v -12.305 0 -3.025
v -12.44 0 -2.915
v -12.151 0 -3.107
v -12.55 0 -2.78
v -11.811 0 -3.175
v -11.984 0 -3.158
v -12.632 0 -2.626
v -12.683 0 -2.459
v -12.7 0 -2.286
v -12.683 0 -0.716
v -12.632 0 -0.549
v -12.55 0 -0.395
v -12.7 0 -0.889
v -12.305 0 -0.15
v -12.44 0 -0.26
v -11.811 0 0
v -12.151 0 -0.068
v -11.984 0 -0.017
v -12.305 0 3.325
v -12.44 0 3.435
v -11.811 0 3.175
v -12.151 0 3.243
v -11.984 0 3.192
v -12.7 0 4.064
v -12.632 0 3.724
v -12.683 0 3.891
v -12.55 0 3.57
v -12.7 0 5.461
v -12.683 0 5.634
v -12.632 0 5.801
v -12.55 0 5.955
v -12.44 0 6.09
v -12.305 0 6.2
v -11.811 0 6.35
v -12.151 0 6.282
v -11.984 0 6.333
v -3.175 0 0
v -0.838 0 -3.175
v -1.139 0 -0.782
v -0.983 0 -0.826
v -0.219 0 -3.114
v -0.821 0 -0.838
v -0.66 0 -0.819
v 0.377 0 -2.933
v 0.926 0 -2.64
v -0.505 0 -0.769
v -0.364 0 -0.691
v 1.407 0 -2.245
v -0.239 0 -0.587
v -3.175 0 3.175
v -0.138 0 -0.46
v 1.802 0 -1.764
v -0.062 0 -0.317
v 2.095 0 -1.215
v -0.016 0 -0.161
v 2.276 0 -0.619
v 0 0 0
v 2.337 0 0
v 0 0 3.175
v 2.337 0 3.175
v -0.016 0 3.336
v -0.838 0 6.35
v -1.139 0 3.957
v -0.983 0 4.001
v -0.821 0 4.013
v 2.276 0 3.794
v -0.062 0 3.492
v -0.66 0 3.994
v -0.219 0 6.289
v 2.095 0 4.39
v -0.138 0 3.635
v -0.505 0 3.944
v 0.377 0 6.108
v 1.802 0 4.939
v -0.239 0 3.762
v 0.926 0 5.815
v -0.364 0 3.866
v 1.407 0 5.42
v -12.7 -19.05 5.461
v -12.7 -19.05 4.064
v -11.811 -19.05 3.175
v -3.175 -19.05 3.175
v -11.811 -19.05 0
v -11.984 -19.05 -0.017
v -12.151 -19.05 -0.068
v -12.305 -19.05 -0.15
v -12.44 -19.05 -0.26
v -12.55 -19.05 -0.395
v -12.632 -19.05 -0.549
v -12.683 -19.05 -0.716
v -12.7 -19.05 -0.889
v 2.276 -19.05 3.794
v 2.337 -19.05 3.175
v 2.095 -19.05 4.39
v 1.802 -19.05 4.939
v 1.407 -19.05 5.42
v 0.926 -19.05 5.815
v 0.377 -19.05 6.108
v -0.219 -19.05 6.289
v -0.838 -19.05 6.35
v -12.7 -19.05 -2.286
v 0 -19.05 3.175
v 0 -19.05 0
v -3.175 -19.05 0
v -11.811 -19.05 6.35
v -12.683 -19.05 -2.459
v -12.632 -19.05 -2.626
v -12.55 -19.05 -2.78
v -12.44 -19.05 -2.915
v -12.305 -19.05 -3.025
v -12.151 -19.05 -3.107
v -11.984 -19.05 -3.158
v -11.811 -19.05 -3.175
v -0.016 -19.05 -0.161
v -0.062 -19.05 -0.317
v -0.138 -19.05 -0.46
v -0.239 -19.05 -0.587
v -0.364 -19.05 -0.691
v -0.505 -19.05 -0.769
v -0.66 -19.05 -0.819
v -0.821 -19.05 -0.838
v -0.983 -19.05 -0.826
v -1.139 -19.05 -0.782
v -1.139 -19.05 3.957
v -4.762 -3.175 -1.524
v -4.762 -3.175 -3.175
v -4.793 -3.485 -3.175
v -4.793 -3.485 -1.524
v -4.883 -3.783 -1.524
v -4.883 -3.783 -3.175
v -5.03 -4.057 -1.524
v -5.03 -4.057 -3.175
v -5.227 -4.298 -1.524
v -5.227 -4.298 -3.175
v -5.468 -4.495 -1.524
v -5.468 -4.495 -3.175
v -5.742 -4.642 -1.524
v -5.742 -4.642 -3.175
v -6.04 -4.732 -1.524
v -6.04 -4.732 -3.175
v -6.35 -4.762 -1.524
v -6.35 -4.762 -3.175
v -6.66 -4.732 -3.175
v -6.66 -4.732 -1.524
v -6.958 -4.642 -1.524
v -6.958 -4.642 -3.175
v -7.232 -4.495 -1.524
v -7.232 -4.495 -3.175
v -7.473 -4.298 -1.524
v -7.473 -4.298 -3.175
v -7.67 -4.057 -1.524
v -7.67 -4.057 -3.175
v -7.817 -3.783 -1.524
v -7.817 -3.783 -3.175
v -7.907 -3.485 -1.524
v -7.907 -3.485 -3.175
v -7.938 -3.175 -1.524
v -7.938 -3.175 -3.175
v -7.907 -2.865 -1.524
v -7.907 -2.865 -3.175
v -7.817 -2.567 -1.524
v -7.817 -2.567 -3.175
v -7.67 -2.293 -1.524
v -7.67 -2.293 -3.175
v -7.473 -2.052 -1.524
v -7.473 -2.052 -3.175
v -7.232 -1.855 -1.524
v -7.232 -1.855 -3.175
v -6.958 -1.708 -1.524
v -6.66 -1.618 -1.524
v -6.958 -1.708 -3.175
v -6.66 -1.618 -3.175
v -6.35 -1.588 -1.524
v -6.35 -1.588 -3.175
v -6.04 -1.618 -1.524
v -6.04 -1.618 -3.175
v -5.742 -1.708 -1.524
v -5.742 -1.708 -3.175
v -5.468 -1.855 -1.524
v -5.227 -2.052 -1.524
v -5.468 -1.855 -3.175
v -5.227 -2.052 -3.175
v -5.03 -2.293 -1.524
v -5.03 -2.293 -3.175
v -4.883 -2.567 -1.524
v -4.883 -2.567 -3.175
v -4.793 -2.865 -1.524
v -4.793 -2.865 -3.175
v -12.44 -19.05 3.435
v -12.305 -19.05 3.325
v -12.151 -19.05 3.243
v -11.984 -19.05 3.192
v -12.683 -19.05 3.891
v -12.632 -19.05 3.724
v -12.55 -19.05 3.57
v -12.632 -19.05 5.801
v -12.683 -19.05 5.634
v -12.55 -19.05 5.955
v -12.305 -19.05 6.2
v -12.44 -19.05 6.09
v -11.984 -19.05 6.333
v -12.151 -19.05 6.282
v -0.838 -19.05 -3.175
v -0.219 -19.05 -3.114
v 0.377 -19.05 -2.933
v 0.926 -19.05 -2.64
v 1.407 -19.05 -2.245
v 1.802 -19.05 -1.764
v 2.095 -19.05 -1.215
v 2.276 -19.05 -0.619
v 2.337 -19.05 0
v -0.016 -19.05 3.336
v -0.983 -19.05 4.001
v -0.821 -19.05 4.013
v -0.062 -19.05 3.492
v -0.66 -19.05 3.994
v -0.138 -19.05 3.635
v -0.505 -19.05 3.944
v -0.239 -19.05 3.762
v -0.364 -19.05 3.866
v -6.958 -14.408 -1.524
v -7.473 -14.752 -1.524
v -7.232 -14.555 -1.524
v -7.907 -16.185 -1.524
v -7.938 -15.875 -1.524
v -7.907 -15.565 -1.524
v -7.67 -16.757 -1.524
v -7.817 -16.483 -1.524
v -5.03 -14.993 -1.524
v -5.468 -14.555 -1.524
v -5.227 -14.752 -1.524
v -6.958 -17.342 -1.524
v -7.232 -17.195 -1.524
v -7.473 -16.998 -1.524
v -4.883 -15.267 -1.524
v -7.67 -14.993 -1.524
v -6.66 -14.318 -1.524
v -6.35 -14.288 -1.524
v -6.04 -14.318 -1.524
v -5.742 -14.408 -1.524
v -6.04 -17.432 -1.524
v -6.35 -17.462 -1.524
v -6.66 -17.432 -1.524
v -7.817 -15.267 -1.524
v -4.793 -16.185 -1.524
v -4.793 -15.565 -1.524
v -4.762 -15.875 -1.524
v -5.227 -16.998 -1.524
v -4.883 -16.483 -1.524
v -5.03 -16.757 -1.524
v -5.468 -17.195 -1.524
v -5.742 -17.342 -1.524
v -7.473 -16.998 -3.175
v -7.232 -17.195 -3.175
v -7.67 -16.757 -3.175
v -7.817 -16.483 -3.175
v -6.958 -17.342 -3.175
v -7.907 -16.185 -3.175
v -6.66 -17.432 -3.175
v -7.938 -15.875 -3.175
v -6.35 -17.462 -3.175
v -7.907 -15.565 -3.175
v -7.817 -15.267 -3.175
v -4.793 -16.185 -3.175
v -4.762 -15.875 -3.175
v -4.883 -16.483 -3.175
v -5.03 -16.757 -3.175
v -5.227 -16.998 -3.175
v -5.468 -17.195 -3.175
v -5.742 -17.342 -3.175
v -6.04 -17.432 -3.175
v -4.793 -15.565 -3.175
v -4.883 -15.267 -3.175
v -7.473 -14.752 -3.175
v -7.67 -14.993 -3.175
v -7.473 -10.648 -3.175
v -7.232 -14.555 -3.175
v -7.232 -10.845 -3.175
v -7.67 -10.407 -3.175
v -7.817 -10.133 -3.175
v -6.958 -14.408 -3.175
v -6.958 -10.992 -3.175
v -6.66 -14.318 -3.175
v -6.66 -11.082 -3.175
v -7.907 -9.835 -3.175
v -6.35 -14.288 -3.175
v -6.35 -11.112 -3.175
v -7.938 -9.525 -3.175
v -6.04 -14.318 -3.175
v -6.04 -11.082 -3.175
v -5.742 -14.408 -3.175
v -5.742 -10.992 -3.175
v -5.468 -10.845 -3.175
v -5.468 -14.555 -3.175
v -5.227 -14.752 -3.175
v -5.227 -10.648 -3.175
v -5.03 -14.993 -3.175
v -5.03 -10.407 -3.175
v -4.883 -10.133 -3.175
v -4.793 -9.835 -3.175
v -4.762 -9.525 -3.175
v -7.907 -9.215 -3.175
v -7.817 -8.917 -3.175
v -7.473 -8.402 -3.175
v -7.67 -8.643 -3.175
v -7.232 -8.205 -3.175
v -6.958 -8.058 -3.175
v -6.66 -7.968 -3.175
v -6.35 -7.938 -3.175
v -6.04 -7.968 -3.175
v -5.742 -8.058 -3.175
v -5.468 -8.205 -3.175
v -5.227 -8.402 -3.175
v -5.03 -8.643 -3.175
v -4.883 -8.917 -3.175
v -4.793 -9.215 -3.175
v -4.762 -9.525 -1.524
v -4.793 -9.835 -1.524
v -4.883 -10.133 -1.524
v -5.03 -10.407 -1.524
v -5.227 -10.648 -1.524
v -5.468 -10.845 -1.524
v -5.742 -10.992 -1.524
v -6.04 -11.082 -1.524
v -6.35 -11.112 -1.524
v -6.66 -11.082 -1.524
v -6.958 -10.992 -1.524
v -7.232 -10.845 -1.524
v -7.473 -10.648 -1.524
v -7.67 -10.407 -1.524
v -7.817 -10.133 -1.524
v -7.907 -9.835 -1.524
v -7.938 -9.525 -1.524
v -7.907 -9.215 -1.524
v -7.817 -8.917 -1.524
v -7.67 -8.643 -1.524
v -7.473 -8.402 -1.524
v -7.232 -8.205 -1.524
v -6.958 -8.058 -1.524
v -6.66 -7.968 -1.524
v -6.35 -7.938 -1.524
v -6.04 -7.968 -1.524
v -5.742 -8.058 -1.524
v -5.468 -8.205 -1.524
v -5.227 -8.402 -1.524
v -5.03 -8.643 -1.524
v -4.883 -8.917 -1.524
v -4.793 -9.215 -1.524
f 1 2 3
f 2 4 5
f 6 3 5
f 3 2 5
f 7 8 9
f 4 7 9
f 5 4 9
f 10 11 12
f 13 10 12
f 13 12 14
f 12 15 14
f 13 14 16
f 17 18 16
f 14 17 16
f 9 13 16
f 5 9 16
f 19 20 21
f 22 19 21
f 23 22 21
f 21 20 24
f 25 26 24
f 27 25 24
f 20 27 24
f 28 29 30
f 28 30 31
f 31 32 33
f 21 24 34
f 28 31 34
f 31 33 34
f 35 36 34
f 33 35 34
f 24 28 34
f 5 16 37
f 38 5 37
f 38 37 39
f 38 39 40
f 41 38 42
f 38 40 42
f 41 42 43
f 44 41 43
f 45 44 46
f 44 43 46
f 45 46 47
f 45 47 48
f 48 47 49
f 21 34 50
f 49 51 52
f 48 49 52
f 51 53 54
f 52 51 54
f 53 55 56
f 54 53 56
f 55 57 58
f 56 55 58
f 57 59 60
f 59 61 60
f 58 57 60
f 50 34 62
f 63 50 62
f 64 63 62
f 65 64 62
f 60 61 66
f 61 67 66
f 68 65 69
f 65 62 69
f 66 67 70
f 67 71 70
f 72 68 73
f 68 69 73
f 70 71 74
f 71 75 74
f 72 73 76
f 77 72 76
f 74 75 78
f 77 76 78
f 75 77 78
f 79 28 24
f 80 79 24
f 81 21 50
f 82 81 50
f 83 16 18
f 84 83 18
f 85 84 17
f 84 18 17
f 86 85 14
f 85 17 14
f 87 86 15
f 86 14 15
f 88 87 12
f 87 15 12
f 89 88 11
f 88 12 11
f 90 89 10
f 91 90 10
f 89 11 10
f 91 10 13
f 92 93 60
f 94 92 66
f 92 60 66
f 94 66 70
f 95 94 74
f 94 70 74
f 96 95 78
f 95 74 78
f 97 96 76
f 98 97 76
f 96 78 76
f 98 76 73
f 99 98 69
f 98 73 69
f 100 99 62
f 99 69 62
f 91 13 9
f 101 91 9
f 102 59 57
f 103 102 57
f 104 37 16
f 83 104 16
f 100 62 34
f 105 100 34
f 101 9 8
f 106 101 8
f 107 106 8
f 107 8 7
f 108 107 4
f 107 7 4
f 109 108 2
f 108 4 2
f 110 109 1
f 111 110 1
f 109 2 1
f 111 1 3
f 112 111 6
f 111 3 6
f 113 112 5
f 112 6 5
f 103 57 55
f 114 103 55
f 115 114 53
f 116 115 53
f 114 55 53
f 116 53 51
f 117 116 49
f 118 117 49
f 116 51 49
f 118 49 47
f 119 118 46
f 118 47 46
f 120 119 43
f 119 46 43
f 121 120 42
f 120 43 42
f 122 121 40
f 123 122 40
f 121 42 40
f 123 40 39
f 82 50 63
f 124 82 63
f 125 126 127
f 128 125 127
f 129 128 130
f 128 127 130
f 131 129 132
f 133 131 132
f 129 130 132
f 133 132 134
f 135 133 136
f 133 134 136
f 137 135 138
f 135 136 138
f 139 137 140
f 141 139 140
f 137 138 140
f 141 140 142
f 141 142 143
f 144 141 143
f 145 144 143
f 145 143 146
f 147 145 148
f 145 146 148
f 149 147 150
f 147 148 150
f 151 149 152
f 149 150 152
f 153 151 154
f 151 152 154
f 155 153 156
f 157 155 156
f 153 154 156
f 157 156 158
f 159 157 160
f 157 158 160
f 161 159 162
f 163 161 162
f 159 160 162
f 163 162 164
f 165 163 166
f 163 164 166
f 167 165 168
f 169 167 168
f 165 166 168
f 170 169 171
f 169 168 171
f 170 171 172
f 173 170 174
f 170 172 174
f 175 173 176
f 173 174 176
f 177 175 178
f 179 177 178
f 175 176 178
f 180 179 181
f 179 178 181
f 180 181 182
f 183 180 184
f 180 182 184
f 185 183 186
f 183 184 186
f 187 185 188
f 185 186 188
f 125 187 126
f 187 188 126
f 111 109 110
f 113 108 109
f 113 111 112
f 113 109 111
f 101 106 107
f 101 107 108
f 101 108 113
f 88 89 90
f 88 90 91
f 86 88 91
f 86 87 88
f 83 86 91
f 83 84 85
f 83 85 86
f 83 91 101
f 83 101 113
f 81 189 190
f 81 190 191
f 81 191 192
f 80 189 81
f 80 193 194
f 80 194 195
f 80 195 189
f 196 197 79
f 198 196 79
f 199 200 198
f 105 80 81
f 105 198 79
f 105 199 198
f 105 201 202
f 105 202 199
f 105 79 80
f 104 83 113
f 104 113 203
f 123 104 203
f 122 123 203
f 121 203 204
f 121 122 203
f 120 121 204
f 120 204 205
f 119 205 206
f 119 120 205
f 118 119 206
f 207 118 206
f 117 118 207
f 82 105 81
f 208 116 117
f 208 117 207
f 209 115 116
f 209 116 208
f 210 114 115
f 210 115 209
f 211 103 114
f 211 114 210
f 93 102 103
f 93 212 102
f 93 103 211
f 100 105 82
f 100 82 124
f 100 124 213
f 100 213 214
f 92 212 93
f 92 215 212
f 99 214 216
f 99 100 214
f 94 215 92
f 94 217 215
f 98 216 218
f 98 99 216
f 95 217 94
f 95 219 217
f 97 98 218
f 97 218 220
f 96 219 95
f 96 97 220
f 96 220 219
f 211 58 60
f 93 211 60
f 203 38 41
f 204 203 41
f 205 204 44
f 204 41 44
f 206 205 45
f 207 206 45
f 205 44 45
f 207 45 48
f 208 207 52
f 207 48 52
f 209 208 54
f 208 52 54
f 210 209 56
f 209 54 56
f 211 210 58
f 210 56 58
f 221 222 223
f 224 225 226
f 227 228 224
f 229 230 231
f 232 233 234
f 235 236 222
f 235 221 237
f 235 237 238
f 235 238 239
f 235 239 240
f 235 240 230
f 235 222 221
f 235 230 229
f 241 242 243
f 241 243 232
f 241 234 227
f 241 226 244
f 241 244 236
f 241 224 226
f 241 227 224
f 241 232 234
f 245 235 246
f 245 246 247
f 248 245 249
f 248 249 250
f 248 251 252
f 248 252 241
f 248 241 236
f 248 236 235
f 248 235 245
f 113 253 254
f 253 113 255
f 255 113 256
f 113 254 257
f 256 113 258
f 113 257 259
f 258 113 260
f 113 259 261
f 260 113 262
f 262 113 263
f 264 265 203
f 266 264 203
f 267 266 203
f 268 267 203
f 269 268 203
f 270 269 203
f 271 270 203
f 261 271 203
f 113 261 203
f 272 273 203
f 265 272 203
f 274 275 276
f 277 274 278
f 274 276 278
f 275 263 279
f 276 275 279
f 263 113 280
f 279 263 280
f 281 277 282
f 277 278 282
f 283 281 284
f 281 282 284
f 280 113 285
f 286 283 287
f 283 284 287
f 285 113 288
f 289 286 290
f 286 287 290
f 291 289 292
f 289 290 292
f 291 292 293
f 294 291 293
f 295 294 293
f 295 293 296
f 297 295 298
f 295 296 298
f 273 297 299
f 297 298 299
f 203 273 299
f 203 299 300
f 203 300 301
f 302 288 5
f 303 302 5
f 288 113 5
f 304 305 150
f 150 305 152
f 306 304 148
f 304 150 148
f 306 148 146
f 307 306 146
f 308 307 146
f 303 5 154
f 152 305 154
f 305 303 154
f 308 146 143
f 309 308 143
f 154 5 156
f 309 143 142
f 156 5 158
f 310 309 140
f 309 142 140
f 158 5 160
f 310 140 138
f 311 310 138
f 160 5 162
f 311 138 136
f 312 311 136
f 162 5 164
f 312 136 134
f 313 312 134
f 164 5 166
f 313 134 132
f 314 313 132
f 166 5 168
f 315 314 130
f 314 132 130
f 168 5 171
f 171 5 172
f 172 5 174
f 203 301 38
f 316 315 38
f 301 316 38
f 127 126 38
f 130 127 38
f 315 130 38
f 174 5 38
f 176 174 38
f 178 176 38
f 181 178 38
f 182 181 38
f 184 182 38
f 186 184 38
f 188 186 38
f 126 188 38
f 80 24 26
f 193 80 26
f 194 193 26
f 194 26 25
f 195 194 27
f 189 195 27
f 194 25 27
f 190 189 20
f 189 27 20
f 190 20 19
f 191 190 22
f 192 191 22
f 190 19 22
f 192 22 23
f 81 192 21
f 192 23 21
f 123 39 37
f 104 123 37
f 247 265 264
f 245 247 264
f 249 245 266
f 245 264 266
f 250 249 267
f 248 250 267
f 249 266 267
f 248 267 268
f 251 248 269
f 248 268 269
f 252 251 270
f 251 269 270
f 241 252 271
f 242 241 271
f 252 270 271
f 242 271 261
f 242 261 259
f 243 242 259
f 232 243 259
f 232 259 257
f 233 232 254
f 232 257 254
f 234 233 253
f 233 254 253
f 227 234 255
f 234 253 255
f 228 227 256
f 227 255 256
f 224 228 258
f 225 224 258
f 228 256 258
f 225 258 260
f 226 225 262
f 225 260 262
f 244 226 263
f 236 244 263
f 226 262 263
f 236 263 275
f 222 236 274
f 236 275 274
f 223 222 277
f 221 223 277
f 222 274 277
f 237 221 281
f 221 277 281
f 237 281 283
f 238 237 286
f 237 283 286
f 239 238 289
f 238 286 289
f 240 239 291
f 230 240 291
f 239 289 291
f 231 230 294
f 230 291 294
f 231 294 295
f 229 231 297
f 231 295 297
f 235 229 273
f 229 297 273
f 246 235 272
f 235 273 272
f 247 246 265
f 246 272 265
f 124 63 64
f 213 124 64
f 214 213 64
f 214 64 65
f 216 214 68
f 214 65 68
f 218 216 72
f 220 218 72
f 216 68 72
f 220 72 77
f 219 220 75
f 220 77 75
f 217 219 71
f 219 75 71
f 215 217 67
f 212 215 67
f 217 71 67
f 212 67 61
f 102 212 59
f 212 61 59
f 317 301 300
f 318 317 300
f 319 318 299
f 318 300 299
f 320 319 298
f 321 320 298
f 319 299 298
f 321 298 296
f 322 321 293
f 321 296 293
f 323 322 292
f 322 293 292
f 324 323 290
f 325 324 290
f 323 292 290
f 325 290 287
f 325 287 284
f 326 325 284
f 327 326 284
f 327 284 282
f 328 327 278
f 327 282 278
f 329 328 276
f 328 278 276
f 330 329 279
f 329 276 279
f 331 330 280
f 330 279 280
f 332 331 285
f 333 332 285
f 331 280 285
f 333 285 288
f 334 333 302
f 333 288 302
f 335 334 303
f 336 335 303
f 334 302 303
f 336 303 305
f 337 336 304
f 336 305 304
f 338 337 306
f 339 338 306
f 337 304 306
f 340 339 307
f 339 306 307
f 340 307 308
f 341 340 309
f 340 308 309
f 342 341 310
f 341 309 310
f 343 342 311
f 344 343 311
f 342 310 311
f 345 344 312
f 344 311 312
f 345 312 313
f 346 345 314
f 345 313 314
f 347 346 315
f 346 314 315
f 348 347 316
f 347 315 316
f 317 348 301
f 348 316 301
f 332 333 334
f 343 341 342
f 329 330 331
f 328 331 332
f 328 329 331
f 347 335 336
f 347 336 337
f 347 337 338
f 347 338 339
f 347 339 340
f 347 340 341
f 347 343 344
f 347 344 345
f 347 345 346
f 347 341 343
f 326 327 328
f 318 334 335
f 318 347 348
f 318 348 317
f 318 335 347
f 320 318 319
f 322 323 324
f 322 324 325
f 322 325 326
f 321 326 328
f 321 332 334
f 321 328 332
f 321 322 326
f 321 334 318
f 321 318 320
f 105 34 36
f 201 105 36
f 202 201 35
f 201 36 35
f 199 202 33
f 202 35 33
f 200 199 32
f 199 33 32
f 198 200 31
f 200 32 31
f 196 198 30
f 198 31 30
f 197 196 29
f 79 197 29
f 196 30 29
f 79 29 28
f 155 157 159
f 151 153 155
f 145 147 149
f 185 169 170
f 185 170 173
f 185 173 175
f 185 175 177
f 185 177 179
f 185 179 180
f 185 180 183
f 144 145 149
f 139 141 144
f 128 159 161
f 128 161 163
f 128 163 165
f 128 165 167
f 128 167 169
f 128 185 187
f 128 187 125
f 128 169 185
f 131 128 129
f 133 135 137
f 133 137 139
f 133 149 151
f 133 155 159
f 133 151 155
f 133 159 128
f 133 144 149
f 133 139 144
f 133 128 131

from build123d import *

# Parameters (mm, degrees)
F1_DEPTH = 19.05
F2_R     = 1.5875
F3_DEPTH = 1.651


with BuildPart() as f1:
    # F0 (on Front) → F1 (new body)
    with BuildSketch(Plane.XZ):
        with BuildLine():
            Line((0, 3.175), (0, 0))
            ThreePointArc((0, 0), (-0.36356, -0.690866), (-1.138859, -0.782422))
            Line((-1.138859, -0.782422), (-3.175, 0))
            Line((-3.175, 0), (-11.811, 0))
            ThreePointArc((-11.811, 0), (-12.439618, -0.260382), (-12.7, -0.889))
            Line((-12.7, -0.889), (-12.7, -2.286))
            ThreePointArc((-12.7, -2.286), (-12.439618, -2.914618), (-11.811, -3.175))
            Line((-11.811, -3.175), (-0.8382, -3.175))
            ThreePointArc((-0.8382, -3.175), (1.406864, -2.245064), (2.3368, 0))
            Line((2.3368, 0), (2.3368, 3.175))
            ThreePointArc((2.3368, 3.175), (1.406864, 5.420064), (-0.8382, 6.35))
            Line((-0.8382, 6.35), (-11.811, 6.35))
            ThreePointArc((-11.811, 6.35), (-12.439618, 6.089618), (-12.7, 5.461))
            Line((-12.7, 5.461), (-12.7, 4.064))
            ThreePointArc((-12.7, 4.064), (-12.439618, 3.435382), (-11.811, 3.175))
            Line((-11.811, 3.175), (-3.175, 3.175))
            Line((-3.175, 3.175), (-1.138859, 3.957422))
            ThreePointArc((-1.138859, 3.957422), (-0.36356, 3.865866), (0, 3.175))
        make_face()
    extrude(amount=F1_DEPTH)

    # F2 (on face) → F3 (cut)
    with BuildSketch(Plane(origin=(0, 0, -3.175), x_dir=(1, 0, 0), z_dir=(0, 0, -1))):
        with Locations((-6.35, 15.875)):
            Circle(F2_R)
        with Locations((-6.35, 3.175)):
            Circle(F2_R)
        with Locations((-6.35, 9.525)):
            Circle(F2_R)
    extrude(amount=-F3_DEPTH, mode=Mode.SUBTRACT)


solid = f1.part
